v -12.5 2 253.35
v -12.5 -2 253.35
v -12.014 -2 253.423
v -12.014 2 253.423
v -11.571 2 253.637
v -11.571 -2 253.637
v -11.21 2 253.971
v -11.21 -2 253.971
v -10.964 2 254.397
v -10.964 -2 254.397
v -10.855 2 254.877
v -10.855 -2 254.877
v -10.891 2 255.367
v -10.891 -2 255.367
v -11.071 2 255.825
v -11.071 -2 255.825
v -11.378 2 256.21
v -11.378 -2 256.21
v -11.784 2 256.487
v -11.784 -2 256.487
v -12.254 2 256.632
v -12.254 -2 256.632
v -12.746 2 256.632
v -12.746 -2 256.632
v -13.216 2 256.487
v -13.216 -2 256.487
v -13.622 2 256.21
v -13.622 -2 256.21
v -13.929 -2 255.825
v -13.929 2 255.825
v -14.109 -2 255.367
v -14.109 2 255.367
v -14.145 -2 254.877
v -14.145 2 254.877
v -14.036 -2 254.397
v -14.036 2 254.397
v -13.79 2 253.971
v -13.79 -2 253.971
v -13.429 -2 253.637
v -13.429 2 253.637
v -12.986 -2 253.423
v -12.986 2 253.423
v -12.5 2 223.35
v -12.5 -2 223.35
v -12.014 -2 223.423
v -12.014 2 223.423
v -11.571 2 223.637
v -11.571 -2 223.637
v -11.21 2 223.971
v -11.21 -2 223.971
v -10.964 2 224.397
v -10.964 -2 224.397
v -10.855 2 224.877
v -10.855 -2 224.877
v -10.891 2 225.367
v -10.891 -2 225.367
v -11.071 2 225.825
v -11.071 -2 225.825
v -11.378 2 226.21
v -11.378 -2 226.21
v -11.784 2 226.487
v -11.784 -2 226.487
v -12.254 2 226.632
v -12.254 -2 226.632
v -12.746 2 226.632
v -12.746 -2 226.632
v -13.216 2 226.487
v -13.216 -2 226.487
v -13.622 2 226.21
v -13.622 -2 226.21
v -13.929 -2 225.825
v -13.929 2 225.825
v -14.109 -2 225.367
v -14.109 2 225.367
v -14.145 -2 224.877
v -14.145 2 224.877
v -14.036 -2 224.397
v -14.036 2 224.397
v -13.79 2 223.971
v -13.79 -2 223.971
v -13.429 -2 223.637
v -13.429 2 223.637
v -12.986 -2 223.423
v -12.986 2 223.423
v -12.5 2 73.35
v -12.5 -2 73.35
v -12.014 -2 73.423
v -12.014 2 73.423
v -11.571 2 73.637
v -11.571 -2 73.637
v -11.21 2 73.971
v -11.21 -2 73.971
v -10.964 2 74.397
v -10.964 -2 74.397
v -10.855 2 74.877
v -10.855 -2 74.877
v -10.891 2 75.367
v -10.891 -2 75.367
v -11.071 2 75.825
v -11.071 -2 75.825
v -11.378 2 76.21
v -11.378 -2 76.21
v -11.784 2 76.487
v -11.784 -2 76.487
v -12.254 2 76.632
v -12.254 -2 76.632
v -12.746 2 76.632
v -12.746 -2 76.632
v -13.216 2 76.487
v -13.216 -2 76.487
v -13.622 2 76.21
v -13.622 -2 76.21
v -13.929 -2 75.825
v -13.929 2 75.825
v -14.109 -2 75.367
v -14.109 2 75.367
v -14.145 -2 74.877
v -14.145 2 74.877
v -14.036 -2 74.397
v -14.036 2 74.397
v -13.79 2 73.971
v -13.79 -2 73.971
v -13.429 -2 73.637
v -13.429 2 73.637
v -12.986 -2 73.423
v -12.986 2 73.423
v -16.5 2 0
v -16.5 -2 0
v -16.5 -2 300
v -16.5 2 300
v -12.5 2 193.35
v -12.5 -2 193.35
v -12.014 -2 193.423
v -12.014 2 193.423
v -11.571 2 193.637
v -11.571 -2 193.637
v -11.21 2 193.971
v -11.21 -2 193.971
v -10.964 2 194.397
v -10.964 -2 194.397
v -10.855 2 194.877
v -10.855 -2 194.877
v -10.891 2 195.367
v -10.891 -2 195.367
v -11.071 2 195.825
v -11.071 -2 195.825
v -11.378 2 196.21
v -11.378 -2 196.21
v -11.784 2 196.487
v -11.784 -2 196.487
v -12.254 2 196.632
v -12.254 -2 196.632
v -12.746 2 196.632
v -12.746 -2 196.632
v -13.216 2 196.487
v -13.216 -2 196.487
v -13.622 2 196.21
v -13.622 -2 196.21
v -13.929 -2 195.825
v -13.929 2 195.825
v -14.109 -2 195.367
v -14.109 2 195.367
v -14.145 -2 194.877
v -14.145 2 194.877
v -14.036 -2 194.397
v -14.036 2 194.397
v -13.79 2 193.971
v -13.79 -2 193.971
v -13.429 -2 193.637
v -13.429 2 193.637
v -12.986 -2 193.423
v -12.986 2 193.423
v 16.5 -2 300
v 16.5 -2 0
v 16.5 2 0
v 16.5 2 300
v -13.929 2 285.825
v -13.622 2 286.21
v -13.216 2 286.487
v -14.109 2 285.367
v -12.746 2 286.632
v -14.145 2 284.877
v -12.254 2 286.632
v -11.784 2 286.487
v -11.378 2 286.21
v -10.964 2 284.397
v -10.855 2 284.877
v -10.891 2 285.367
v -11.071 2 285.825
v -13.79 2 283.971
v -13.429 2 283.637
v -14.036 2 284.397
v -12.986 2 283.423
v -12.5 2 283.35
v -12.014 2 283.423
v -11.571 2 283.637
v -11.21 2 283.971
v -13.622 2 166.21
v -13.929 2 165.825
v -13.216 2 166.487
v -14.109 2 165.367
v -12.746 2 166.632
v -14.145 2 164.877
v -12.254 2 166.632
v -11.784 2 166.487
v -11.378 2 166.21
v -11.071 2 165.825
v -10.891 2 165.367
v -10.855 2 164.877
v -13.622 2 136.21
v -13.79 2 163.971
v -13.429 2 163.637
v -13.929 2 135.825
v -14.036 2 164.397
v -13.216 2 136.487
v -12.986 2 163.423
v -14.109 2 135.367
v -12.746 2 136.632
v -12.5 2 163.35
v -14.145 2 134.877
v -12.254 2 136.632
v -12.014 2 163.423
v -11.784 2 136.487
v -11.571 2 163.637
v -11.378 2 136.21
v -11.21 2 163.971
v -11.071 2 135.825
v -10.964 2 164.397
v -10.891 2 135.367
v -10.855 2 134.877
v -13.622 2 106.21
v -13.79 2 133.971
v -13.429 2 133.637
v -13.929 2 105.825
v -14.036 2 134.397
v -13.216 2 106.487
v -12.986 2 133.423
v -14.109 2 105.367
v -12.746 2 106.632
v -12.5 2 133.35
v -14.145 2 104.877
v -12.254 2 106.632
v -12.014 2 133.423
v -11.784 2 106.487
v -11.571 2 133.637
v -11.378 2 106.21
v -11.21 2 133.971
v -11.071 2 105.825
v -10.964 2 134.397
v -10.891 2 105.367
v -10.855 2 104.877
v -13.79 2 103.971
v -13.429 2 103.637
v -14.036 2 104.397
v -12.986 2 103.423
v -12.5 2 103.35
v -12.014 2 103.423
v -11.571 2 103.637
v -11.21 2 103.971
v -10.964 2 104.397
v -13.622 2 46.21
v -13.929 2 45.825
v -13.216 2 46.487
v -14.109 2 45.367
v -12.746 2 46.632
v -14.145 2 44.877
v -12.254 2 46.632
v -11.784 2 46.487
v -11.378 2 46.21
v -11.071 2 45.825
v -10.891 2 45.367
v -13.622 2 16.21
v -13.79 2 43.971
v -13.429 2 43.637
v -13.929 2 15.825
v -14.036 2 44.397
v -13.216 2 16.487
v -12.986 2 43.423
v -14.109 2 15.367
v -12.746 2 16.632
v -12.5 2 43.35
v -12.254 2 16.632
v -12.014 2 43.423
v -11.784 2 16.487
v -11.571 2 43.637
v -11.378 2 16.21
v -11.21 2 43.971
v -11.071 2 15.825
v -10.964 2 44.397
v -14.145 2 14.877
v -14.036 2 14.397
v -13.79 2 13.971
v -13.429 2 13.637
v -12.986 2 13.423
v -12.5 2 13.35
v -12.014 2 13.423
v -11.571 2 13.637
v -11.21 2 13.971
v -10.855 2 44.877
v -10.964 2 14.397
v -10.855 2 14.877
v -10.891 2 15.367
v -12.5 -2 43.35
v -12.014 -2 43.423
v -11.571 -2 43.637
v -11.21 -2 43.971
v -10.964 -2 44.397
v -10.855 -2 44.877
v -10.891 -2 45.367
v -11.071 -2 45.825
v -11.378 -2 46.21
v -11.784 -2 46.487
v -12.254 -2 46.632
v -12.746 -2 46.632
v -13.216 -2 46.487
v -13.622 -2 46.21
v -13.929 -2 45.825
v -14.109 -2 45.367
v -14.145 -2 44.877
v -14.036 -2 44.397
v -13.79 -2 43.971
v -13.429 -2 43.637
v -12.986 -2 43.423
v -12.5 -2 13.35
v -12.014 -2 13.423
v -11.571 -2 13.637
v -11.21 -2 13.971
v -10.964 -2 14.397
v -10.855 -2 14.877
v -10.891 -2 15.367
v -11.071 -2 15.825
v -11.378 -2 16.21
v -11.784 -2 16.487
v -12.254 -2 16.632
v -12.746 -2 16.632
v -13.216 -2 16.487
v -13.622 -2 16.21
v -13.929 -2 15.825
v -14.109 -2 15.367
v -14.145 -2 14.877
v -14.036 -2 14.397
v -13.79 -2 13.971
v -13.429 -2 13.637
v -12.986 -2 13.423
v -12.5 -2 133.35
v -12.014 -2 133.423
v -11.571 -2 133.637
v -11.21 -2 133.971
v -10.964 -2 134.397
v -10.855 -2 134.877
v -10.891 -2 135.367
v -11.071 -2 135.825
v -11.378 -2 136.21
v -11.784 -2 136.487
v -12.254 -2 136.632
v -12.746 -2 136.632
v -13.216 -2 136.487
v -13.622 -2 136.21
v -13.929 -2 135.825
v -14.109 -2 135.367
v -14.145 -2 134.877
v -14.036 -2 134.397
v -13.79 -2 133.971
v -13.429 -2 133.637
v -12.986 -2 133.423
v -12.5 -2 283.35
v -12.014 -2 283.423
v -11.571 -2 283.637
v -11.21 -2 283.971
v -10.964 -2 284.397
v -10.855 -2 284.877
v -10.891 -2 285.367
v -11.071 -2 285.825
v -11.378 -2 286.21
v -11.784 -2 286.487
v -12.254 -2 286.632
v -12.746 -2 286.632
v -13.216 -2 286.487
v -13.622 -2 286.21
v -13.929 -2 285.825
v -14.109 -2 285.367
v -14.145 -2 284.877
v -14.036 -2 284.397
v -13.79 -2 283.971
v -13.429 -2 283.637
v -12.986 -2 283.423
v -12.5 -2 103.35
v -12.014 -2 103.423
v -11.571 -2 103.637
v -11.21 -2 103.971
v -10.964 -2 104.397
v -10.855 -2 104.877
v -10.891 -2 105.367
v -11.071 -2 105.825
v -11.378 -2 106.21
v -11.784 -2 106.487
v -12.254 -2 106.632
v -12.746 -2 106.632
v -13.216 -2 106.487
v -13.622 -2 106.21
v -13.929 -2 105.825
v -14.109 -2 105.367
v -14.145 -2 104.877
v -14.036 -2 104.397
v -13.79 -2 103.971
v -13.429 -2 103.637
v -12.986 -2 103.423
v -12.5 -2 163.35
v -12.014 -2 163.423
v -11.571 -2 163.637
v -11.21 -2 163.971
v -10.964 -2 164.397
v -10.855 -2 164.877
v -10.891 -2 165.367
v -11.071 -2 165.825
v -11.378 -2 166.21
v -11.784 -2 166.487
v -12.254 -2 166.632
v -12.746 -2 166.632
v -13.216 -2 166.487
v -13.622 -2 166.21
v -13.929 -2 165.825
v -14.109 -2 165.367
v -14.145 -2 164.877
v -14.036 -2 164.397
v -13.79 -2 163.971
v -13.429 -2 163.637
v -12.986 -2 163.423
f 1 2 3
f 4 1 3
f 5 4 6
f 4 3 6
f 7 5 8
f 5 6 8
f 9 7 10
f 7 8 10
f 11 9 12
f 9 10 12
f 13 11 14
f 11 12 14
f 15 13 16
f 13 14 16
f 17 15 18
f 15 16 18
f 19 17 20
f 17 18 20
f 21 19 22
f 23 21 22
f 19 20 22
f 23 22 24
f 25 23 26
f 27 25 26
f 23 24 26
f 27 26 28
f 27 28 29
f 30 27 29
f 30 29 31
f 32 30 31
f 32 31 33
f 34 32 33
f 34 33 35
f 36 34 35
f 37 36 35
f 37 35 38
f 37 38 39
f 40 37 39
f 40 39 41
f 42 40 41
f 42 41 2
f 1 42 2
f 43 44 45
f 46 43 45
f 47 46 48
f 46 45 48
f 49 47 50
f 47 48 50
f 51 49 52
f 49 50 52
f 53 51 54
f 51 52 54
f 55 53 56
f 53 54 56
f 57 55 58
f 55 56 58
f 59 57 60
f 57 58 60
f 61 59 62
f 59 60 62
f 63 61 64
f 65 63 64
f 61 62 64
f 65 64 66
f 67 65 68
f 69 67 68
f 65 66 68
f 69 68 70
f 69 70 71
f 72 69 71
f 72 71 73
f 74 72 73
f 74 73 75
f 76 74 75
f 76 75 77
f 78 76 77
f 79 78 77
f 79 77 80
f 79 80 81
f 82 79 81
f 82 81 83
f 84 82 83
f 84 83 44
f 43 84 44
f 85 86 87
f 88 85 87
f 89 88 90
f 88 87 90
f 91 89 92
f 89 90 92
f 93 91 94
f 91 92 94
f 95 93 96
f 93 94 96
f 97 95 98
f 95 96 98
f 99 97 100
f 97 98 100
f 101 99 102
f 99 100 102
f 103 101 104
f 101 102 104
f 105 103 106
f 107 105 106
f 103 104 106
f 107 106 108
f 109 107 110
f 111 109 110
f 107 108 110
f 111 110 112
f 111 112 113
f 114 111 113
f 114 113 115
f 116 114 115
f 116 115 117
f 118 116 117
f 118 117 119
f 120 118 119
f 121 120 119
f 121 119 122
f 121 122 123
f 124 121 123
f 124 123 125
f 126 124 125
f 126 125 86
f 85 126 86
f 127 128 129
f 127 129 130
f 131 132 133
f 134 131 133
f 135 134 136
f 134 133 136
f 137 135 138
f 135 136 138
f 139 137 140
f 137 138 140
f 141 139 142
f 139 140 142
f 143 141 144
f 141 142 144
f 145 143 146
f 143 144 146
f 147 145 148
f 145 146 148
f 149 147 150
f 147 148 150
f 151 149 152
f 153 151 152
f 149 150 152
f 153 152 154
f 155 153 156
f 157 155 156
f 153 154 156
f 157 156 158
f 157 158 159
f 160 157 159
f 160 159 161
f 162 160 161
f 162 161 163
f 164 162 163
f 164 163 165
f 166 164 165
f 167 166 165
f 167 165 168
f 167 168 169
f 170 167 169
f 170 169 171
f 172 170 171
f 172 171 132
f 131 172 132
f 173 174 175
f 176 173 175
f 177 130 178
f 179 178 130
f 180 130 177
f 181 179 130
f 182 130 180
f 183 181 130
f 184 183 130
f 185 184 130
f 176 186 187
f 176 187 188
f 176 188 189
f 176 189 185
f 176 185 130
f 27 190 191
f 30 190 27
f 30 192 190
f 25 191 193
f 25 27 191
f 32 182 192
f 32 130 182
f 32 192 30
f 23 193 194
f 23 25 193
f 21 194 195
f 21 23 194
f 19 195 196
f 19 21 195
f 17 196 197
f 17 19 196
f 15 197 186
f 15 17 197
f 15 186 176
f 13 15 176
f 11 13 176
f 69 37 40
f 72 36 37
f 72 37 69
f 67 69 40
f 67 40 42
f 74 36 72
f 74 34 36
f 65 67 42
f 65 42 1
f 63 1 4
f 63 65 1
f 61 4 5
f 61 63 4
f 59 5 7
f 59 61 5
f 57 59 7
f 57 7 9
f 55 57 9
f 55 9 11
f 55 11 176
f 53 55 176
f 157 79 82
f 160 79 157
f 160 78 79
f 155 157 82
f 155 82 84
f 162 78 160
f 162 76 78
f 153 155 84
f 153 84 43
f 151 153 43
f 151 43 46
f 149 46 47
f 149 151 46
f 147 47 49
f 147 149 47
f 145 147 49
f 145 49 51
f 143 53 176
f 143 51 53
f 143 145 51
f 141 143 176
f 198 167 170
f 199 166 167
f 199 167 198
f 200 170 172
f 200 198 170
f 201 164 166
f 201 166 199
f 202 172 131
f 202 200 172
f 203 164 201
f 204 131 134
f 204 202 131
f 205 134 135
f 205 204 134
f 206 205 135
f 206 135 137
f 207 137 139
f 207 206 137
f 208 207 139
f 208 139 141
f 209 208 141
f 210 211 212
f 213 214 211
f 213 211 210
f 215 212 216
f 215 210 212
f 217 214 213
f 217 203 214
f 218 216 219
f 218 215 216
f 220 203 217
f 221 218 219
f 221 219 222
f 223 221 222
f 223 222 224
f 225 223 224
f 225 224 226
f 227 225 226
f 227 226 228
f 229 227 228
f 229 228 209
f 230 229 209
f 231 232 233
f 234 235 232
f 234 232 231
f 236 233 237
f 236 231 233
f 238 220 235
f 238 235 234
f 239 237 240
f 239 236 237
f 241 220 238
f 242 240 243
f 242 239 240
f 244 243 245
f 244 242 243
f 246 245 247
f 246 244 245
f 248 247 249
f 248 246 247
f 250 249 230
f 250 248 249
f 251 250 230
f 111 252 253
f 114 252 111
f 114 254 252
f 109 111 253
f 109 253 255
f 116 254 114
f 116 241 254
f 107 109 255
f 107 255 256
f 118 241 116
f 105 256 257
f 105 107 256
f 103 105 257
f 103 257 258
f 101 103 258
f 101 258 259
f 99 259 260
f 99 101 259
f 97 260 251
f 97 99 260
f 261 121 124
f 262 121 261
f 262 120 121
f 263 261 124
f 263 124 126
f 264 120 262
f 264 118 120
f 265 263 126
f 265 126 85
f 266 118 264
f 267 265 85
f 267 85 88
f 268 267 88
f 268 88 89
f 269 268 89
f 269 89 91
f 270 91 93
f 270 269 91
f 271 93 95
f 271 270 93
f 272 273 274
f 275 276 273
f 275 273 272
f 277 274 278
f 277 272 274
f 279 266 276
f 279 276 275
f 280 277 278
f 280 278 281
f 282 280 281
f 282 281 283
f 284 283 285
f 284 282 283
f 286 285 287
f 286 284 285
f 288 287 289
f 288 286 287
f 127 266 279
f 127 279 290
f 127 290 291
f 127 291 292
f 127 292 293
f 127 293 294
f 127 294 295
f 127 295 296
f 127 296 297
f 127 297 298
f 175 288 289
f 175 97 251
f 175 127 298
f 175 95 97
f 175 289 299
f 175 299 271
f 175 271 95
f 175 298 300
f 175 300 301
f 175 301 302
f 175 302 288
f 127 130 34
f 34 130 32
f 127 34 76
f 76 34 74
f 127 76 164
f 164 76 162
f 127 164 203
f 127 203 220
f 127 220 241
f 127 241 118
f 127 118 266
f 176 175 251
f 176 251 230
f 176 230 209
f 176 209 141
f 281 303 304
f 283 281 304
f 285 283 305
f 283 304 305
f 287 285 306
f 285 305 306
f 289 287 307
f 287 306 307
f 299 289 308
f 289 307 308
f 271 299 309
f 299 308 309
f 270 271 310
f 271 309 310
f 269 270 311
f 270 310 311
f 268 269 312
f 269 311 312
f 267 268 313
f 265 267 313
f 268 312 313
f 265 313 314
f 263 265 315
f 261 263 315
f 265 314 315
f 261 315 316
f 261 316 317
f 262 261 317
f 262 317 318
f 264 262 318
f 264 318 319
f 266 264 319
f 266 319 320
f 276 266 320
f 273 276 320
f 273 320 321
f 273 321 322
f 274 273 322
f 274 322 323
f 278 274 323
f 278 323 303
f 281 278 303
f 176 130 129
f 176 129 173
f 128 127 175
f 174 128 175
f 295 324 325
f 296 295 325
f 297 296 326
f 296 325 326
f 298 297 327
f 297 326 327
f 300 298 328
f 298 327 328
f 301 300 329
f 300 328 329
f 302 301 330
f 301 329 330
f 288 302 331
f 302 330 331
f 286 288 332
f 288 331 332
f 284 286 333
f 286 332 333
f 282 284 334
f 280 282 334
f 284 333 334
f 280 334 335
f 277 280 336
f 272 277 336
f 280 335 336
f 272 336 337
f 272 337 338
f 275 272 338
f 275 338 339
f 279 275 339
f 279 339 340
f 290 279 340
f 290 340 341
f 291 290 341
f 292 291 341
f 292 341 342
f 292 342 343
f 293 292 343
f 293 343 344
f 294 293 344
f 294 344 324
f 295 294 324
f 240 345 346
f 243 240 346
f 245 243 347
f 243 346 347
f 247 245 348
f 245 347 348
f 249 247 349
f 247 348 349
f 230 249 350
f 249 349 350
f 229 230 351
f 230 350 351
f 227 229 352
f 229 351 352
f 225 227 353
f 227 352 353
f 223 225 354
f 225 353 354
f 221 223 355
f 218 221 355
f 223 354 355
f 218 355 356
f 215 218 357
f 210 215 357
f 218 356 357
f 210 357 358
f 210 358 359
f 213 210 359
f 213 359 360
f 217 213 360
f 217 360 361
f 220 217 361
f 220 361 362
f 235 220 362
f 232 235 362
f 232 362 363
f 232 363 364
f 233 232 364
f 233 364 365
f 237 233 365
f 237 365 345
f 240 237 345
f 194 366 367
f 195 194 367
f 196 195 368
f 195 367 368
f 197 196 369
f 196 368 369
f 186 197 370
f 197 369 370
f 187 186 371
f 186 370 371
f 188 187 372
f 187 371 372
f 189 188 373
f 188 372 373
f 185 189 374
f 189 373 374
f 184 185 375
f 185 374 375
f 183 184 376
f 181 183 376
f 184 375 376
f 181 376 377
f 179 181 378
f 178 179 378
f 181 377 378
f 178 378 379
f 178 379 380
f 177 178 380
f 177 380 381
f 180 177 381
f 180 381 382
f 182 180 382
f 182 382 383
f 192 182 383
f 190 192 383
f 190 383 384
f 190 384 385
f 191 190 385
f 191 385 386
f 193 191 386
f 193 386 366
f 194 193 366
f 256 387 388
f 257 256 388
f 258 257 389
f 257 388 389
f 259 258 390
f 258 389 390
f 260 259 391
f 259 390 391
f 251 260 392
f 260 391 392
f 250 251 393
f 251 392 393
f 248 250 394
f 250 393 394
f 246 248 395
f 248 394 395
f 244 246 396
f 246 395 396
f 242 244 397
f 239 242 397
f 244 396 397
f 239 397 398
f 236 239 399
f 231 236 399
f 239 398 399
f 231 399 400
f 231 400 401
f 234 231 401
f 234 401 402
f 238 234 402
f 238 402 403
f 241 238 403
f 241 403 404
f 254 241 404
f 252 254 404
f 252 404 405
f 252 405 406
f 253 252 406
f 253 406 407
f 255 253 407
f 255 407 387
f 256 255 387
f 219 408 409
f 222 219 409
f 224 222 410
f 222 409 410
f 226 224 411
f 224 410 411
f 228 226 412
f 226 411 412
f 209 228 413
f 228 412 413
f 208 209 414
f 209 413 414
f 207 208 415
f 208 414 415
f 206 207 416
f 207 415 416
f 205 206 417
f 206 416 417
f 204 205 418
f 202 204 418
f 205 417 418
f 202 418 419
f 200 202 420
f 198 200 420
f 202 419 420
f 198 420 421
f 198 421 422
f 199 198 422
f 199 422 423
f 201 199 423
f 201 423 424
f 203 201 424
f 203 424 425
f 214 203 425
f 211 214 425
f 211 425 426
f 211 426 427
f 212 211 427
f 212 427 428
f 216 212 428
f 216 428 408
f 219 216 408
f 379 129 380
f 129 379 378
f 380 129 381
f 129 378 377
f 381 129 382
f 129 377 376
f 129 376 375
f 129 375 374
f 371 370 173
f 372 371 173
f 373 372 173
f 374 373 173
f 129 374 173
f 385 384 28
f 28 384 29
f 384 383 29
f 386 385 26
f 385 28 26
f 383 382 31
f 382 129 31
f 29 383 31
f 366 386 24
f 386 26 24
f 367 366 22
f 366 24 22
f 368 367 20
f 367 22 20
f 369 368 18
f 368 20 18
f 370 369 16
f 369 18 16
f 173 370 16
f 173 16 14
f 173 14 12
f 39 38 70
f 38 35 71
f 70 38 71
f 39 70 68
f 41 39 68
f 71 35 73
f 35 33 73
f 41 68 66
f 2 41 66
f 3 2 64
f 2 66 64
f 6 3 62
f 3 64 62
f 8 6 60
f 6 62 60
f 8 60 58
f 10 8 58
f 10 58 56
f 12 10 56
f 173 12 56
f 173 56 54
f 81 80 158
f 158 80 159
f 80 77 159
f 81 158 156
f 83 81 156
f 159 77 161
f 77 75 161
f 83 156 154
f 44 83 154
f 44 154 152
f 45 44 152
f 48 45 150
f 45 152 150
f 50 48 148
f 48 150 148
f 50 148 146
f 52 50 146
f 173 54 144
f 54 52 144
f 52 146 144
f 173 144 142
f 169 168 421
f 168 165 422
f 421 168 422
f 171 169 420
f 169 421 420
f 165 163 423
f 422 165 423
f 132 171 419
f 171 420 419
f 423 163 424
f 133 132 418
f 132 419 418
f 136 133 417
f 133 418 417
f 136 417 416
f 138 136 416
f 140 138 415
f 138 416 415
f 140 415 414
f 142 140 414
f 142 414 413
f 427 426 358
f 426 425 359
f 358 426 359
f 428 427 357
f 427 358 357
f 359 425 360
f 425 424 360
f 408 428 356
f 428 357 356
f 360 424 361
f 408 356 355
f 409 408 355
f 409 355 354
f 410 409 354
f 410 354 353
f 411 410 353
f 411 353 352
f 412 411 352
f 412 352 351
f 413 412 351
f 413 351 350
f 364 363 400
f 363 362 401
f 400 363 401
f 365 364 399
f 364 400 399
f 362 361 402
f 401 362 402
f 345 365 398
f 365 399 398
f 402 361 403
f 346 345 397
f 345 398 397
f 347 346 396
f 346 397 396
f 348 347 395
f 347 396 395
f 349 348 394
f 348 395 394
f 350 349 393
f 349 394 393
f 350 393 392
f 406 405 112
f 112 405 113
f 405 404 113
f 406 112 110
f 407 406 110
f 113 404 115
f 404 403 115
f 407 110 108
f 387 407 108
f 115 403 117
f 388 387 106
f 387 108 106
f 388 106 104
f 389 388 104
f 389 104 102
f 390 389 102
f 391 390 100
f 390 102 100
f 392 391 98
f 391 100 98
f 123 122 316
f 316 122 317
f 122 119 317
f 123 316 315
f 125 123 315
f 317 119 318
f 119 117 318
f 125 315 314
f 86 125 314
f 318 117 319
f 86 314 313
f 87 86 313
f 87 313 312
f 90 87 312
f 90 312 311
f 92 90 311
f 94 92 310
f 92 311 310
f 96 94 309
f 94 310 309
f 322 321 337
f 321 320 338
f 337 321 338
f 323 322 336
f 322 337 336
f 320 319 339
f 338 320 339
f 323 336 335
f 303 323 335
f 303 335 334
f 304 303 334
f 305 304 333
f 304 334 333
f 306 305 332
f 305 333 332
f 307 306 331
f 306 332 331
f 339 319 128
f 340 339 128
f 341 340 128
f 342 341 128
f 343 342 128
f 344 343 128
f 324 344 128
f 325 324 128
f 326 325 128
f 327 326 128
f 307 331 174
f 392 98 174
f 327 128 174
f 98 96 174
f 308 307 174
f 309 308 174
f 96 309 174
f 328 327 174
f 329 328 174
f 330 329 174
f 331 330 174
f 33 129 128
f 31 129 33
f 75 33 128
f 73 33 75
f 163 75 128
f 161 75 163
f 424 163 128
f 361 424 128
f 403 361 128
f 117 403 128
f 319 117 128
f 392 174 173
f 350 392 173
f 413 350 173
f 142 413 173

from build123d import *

# Parameters (mm, degrees)
SKETCH1_W           = 33
SKETCH1_H           = 4
BOSS_EXTRUDE1_DEPTH = 300
M4_TAPPED_HOLE1_D   = 3.3
LPATTERN1_COUNT     = 10
LPATTERN1_PITCH     = 30


with BuildPart() as part:
    # Sketch1 → Boss-Extrude1 (new body)
    with BuildSketch(Plane.XY):
        Rectangle(SKETCH1_W, SKETCH1_H)
    extrude(amount=BOSS_EXTRUDE1_DEPTH)

    # M4 Tapped Hole1 (through all)
    with Locations(Plane(origin=(-12.5, 2, 15), x_dir=(0, 0, 1), z_dir=(0, 1, 0))):
        with Locations((0, 0)):
            m4_tapped_hole1 = Hole(M4_TAPPED_HOLE1_D / 2)

    # LPattern1: M4 Tapped Hole1 ×10
    with Locations(*[(0, 0, i * LPATTERN1_PITCH) for i in range(1, LPATTERN1_COUNT)]):
        add(m4_tapped_hole1, mode=Mode.SUBTRACT)


solid = part.part
